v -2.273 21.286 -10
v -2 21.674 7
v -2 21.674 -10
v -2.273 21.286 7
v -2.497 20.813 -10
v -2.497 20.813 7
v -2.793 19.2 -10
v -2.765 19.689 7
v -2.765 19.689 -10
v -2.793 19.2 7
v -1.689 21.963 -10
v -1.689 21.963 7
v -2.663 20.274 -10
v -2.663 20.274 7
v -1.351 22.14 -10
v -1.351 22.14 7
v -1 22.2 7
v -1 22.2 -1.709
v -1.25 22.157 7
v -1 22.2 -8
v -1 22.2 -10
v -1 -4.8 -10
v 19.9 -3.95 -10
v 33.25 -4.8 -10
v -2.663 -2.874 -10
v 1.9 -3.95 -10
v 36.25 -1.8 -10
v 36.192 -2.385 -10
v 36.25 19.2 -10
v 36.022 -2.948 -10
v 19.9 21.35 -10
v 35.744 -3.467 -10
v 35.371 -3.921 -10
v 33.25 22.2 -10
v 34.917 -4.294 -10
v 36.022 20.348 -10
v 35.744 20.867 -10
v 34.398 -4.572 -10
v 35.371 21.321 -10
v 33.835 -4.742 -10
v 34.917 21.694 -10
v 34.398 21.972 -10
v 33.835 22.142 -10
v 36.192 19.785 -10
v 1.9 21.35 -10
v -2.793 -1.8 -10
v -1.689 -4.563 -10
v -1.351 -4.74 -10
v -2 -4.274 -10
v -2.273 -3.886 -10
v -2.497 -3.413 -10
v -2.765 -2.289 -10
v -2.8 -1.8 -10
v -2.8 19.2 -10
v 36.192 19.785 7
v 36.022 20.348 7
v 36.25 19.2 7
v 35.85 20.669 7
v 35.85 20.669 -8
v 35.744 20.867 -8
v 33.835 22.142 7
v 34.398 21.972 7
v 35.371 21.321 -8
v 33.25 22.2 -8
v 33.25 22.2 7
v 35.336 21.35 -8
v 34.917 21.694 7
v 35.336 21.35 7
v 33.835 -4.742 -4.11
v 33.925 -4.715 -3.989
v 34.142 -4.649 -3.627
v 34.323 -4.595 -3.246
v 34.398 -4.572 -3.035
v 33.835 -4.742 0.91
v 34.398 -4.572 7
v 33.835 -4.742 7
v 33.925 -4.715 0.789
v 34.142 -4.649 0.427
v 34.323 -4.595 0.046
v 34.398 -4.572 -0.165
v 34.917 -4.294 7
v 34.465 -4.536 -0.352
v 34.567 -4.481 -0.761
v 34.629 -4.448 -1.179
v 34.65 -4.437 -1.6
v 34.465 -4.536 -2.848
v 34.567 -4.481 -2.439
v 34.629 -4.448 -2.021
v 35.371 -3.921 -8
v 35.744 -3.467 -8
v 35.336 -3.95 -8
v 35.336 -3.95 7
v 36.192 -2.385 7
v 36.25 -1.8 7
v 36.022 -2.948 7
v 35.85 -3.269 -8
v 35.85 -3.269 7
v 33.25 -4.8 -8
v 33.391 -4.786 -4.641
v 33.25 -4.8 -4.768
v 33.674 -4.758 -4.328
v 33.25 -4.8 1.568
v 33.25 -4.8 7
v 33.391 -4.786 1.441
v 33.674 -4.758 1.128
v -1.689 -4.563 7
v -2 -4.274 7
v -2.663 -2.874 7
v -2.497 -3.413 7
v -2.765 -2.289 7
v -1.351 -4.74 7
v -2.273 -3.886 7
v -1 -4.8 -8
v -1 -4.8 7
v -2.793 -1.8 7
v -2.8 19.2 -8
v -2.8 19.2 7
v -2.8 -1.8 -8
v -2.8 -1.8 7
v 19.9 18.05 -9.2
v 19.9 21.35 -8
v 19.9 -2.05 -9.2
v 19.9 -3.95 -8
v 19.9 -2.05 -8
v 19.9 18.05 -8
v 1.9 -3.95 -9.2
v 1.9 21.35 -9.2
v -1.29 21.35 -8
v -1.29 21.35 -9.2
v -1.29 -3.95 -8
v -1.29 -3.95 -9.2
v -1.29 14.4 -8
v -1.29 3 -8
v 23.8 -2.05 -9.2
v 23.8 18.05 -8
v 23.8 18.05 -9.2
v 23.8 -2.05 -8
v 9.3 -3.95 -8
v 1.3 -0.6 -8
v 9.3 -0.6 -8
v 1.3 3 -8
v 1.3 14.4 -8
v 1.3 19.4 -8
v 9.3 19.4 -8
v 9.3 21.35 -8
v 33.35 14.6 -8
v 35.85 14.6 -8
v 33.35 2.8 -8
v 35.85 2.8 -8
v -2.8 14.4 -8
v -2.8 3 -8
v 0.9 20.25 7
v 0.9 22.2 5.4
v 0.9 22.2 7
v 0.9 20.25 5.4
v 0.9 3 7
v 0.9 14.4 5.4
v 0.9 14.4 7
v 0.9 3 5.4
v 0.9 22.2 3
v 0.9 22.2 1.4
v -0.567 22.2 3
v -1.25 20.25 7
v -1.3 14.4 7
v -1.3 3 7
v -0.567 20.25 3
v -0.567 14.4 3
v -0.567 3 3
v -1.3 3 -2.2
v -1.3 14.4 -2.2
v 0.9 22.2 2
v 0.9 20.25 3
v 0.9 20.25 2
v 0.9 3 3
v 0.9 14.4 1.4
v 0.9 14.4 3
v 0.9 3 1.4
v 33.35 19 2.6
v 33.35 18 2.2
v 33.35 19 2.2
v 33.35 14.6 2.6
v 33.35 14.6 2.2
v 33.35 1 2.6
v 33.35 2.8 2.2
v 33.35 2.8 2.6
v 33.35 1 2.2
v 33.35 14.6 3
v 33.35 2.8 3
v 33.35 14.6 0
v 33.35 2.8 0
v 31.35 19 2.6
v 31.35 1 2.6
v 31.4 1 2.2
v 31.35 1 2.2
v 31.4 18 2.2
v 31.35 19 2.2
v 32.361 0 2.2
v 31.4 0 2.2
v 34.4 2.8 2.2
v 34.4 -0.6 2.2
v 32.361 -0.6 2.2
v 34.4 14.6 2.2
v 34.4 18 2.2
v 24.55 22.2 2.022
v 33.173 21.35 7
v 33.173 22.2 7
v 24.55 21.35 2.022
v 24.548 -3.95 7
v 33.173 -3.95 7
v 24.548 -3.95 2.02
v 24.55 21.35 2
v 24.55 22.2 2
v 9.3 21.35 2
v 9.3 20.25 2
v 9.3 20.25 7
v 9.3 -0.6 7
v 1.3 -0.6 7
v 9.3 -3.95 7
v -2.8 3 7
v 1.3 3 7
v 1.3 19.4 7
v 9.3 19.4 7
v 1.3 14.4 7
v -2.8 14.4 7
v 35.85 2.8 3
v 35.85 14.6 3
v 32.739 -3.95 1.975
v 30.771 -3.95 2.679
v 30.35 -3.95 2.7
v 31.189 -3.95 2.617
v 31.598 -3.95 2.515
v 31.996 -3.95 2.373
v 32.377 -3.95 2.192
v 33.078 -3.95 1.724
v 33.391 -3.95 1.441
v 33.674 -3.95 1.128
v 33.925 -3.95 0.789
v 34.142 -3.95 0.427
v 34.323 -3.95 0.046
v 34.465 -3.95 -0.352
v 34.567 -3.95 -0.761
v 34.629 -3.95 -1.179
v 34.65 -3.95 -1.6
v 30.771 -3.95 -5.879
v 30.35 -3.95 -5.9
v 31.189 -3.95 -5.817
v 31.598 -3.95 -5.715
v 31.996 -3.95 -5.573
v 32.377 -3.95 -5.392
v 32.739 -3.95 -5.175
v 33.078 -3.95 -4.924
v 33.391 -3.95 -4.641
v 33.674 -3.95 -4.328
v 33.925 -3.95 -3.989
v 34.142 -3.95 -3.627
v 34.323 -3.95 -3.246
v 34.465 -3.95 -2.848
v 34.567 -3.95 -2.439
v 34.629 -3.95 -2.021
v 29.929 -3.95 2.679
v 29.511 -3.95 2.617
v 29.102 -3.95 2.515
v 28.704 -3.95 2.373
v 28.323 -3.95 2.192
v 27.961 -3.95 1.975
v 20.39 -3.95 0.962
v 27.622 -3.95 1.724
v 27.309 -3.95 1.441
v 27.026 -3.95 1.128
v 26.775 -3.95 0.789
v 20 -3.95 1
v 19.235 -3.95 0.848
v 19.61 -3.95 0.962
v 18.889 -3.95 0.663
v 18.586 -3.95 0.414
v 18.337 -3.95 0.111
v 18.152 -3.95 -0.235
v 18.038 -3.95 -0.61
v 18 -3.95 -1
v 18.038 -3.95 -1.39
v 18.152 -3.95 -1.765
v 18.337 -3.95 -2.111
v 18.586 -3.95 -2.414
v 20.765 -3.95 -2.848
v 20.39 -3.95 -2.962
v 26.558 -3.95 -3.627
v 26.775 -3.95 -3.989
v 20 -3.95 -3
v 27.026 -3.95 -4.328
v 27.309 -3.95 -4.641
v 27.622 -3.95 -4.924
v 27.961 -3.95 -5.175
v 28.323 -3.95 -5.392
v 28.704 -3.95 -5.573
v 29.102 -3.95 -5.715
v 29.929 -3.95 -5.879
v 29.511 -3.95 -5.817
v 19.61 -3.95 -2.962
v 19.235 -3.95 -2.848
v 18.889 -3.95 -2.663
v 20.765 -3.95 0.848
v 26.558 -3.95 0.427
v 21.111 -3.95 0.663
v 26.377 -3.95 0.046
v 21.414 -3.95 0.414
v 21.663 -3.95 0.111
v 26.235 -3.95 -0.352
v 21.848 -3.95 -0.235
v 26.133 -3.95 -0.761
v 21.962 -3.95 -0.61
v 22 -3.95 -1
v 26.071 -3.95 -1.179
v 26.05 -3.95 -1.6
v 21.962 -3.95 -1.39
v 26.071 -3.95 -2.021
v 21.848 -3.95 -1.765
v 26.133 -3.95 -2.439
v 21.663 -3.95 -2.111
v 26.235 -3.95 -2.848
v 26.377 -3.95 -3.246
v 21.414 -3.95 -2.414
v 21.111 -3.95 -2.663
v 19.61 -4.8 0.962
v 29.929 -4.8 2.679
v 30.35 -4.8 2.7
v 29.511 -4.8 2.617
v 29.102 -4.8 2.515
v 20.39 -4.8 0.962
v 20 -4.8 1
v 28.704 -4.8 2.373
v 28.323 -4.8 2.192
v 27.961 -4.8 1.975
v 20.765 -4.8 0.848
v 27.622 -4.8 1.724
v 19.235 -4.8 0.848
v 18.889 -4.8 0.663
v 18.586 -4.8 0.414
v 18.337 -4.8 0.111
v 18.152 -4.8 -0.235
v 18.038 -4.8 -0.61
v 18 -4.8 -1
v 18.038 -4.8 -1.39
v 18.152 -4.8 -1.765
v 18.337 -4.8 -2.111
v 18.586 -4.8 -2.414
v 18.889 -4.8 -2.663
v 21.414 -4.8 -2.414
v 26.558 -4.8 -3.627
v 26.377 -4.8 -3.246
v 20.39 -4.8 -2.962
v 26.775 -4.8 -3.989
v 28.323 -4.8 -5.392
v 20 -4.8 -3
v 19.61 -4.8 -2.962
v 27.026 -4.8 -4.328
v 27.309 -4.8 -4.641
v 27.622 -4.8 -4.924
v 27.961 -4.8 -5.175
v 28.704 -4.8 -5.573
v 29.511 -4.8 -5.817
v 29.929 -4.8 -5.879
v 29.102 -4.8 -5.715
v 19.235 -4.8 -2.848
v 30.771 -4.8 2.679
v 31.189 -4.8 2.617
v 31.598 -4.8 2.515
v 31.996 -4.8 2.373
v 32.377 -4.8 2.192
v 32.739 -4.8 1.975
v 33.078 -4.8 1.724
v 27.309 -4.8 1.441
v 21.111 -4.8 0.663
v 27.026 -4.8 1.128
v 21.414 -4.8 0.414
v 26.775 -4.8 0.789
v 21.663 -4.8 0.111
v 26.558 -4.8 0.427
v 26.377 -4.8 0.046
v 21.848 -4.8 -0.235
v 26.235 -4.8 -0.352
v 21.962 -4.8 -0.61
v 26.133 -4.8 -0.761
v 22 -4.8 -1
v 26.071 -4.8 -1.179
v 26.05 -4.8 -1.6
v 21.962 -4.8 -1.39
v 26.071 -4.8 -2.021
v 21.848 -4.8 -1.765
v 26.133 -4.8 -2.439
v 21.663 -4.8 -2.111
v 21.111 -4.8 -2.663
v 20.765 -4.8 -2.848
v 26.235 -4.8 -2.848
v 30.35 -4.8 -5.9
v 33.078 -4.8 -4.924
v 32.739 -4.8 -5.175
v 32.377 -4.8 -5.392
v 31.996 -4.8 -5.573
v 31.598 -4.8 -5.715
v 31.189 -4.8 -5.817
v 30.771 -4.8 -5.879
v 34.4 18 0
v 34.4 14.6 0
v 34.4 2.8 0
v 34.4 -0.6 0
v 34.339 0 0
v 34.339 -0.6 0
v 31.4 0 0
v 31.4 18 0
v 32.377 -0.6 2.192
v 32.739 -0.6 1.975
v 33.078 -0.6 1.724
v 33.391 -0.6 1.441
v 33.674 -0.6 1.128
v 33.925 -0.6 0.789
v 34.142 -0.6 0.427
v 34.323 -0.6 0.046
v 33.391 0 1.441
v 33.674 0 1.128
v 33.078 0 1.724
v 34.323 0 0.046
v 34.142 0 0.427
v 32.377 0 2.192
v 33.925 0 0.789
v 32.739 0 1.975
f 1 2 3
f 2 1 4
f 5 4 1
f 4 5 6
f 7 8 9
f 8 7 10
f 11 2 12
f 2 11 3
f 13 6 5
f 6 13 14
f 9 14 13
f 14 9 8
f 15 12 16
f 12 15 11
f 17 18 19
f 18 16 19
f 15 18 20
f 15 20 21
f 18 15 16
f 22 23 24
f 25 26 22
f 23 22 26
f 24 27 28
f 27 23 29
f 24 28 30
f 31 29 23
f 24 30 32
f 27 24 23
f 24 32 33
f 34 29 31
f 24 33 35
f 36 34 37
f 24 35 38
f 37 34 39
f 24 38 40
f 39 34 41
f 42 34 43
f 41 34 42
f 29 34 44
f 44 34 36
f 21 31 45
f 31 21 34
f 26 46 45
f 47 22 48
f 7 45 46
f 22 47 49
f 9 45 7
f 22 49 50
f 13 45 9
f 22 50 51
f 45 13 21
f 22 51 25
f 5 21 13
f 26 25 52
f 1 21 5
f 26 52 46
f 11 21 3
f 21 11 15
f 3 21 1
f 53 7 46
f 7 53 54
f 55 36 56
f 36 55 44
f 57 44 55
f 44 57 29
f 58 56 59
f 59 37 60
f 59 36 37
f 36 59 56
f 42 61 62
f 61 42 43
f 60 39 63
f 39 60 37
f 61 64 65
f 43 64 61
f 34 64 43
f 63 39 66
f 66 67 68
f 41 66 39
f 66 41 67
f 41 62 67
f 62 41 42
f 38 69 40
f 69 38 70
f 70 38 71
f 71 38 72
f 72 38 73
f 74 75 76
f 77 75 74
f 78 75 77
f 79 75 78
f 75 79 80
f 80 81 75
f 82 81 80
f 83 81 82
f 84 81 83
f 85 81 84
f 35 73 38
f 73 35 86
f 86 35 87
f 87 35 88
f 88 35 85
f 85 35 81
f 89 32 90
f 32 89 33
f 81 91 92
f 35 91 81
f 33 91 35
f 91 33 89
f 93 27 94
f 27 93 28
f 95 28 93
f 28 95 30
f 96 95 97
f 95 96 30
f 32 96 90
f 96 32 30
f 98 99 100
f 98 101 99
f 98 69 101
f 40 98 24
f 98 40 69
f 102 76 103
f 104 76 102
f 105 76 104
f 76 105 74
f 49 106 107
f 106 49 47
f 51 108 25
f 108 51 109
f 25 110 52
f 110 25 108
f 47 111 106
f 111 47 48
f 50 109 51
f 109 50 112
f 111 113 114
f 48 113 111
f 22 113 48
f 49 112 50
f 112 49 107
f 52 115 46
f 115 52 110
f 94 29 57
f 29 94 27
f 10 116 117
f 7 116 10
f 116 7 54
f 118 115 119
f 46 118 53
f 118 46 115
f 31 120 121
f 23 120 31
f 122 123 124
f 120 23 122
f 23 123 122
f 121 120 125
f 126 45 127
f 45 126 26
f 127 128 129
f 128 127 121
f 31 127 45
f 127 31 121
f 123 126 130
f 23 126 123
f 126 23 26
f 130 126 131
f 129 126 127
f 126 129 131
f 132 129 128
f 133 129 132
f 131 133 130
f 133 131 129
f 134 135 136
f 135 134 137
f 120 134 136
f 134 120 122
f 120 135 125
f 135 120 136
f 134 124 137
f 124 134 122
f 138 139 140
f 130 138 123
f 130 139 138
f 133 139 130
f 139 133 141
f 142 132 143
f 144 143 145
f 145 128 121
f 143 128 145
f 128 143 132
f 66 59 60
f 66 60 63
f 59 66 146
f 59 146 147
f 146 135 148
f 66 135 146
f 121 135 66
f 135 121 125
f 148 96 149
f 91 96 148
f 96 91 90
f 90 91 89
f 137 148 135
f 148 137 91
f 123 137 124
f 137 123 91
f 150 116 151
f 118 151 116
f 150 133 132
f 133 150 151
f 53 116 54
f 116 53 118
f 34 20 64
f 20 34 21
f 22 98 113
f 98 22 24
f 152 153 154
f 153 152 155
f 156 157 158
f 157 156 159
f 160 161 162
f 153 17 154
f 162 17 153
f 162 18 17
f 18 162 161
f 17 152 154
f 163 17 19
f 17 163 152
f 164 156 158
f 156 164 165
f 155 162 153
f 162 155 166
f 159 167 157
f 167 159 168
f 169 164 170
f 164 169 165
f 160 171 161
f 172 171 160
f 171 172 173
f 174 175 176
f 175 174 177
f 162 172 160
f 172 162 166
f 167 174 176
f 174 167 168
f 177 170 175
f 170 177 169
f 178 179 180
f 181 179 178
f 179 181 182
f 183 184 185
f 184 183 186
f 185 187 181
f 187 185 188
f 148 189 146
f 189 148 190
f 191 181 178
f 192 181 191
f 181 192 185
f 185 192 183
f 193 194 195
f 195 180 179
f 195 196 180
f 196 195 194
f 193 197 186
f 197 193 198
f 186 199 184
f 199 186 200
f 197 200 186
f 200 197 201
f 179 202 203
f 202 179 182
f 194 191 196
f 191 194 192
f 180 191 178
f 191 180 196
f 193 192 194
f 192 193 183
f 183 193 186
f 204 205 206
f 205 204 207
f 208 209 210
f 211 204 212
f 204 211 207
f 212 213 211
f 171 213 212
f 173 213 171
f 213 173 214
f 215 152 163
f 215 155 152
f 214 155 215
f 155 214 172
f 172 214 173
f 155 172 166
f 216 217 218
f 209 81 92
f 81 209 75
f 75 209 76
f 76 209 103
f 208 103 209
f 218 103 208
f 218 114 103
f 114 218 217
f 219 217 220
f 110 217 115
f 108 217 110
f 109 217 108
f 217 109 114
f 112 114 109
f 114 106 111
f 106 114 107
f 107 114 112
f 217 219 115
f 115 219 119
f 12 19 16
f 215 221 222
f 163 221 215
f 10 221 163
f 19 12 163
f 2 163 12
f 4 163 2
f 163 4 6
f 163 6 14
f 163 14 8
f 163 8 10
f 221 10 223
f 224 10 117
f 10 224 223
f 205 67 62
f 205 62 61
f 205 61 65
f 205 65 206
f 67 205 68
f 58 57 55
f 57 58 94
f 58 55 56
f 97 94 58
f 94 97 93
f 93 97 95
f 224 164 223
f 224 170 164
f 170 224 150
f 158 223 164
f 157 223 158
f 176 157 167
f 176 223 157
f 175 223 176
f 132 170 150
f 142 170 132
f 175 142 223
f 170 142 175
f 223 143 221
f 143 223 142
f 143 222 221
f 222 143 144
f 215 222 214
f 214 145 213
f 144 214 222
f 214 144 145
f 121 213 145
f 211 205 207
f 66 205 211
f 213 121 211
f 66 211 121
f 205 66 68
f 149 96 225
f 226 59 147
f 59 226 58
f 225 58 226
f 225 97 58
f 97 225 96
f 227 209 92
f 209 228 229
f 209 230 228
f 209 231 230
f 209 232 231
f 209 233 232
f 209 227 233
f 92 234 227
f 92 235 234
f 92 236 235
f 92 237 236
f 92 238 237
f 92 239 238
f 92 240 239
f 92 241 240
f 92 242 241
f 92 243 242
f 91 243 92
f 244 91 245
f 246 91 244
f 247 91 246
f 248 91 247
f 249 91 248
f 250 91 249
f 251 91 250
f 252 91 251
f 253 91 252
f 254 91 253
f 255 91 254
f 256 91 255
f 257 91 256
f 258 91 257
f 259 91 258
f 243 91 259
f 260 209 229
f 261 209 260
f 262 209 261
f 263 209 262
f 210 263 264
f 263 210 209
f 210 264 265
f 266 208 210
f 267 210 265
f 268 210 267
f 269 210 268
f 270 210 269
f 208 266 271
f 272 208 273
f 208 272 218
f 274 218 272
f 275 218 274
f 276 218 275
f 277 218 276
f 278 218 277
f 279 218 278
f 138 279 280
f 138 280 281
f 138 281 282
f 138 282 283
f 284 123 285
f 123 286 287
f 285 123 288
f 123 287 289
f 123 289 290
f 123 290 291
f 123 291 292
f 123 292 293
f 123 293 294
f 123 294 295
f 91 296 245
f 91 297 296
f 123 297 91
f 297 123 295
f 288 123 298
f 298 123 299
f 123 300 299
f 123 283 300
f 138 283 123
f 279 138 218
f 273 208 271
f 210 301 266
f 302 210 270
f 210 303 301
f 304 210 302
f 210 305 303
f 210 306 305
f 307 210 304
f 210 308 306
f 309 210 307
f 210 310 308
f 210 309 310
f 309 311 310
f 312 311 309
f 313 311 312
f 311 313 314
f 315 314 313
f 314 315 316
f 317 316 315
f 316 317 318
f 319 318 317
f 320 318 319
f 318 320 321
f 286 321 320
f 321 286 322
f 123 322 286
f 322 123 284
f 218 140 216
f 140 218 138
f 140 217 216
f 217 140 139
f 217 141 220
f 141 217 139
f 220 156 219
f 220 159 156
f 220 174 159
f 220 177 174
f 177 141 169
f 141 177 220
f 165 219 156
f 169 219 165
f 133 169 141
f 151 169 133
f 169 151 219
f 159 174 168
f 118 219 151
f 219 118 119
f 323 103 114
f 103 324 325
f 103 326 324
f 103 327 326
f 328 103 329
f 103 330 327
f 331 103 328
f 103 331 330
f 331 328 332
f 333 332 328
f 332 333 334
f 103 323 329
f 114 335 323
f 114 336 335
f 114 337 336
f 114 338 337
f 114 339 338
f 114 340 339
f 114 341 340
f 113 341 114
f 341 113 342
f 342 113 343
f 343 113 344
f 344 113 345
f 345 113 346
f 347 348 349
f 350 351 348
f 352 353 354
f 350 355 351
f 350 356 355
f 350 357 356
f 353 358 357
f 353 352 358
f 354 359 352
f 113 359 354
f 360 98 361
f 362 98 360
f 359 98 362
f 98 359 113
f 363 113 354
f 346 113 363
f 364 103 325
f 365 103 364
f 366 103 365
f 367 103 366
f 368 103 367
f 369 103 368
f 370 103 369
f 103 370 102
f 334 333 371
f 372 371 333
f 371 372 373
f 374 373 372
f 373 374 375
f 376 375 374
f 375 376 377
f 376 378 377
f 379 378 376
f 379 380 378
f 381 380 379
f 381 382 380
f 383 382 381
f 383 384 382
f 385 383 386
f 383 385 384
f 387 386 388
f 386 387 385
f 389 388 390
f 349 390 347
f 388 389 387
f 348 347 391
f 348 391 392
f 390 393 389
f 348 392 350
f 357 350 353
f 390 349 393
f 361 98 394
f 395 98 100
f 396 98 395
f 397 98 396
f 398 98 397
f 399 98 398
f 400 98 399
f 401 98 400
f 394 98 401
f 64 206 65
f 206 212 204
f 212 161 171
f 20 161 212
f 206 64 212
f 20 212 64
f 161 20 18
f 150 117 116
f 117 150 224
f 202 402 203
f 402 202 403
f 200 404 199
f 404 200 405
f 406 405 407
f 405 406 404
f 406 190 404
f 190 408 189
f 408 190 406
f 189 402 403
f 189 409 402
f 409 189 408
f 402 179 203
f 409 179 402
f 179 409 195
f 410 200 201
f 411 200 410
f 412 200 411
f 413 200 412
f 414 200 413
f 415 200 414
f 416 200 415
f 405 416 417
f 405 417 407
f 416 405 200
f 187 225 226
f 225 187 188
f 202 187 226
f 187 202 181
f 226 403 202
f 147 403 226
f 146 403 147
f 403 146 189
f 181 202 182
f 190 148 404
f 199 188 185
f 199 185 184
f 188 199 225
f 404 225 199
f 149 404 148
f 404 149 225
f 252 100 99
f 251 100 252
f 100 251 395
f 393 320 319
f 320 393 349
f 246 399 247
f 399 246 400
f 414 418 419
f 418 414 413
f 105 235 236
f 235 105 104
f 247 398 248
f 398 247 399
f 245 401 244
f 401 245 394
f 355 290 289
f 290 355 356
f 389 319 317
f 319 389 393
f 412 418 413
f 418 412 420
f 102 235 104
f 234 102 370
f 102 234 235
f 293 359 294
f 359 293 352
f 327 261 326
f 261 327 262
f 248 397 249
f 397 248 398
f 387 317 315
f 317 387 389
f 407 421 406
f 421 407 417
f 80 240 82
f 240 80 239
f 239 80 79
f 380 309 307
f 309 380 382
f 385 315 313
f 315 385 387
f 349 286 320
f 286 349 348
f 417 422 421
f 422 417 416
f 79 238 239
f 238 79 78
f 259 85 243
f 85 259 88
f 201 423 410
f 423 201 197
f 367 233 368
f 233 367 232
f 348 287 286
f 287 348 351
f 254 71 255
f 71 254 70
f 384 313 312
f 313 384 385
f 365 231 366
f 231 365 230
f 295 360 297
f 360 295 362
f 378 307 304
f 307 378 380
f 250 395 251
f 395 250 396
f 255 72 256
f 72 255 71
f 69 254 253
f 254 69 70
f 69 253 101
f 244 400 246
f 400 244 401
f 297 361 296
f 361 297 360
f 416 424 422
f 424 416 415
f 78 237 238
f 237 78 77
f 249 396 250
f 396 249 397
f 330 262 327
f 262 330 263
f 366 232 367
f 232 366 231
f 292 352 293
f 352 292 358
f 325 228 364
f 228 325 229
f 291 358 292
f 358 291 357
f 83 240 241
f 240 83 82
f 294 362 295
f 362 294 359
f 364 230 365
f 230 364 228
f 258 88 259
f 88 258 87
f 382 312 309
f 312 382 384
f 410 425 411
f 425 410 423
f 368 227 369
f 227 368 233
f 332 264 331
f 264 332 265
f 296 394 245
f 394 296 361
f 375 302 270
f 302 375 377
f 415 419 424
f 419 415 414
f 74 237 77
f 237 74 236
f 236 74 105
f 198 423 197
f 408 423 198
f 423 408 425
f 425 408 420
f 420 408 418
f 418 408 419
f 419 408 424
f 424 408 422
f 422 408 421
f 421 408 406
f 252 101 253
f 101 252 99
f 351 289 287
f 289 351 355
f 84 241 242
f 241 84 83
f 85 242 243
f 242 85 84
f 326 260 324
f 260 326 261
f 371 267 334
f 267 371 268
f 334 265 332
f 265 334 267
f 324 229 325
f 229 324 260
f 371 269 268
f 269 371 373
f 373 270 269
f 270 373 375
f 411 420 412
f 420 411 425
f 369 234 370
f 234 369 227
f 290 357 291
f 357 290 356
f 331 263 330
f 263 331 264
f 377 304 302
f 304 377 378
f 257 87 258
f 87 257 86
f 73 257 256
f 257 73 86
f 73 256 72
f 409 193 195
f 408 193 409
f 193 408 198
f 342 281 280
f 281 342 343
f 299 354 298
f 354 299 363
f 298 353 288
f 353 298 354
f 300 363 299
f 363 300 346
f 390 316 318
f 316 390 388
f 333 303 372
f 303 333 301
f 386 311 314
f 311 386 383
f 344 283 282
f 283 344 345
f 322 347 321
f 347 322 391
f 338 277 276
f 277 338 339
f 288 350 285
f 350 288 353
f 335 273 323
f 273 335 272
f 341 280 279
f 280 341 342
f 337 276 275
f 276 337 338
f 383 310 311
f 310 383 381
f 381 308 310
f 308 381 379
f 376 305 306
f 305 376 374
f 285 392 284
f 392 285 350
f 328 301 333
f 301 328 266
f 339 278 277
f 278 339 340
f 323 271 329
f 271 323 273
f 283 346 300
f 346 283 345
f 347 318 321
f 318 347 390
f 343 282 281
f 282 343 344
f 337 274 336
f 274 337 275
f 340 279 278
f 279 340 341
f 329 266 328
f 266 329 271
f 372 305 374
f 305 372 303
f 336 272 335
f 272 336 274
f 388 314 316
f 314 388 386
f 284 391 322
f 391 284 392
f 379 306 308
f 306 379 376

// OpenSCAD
w = 33;
d = 18.2;
h = 1.5 + .1;

USB_PADDING = 4.4;
OVERLAP = 2.5;
XMAX = 1.1;
JACKD = 8 + 0.2;
tx = 1.25;
ty = 0.4;
HEADER_D = 3;
HEADER_H = 0.2 * 8;
H_MULT = 16;

OLED_OFFSET = 0.8;
OLED_BW = 25.3 + OLED_OFFSET;
OLED_BD = 26.1 + OLED_OFFSET;
OLED_H = 6;

BASE_W = w + (2 * tx) + 0.4;
BASE_D = d + 0.4;
BASE_H = (0.2 * 3) + HEADER_H;

SIDE_H = BASE_H + (0.2 * H_MULT + h);
SIDE_T = 1.6;
SIDE_LONG = w + .6 + .5 + 0.4;
SLTX = SIDE_T - 0.2;

PCB_W = d + 0.4;

OLED_SW = 25.3;
OLED_SD = 16.8;

OLED_B = [OLED_BD + 9.2, OLED_BW, OLED_H];
OLED_S = [OLED_SD + 1.2, OLED_SW, 8];
OLED_B2 = [
  OLED_B[0] + 4.15, 
  OLED_B[1] + 0.9, 
  OLED_B[2] - 4
];

MIC_D = 8.6;
MIC_D_RING = 11;


OLED_TY = (OLED_BW - BASE_W) / 2 + 1.35 - OLED_OFFSET;  
w1 = 3.45;

WALL_POLY = [
  [-2.8, -4.8],
  
  [w + w1 + 1, -4.8],
  [w + w1 + 1, 3],  
  [w + w1 - 3.1, 3],
  [w + w1 - 3.1, -2.0],
  [w + w1 - 11.1, -2],
  
  [w + w1 - 11.1, -5.15 + 1.2],
  [-2.4 + 1.2, -5.15 + 1.2],
  [-2.4 + 1.2, d + 4.35 - 1.2],
  [w + w1 - 11.1, d + 4.35 - 1.2],
  
  [w + w1 - 11.1, d - 0.2],
  [w + w1 - 3.1, d - 0.2],
  [w + w1 - 3.1, d + 4.35 - 8.15],
  [w + w1 + 1, d + 4.35 - 8.15],
  [w + w1 + 1, d + 4.0],
  
  [-2.8, d + 4.0]
];

BR = 3;

module clip(d, zr = 0) {
  rotate([90, 0, zr])
    translate([-1.8, 0, 0])
      linear_extrude(d)
        polygon([          
          [2.2, h - 4],
          [2.2, h * 1.75],
          [0, h * 1.75],
          [0, h * 1.5],
          [0, h - 0.4]
        ]);
  }
  
module oledSlicer(extraH = 0) {
  translate([
      OLED_OFFSET / 2, 
      OLED_OFFSET / 2,
      0.2 * 4 - extraH
    ])
      cube([
        OLED_BD - OLED_OFFSET,
        OLED_B[1] - OLED_OFFSET,
        0.2 * 8 + extraH
      ]);
}
 
intersection() {
  if (!$preview) {
    translate([
      -2.35 - SIDE_T - 0.05, 
      OLED_TY - 0.45, 
      -OLED_H
    ])
      translate([0, 0, -0.2 * 12 - .6 - 1]) {
        H = OLED_B2[2] + 18;
        translate([BR, OLED_B2[1] - BR - .12, 0]) 
          scale([.6, 1.04, 1]) 
            cylinder(H, d = BR * 2, $fn = 32);
        
        translate([OLED_B2[0] - BR, OLED_B2[1] - BR, 0])
          cylinder(H, d = BR * 2, $fn = 32);
        
        translate([OLED_B2[0] - BR, BR, 0]) 
          cylinder(H, d = BR * 2, $fn = 32);
        
        translate([BR, BR + .12, 0]) scale([.6, 1.04, 1]) 
          cylinder(H, d = BR * 2, $fn = 32);
        
        translate([BR, 0, 0]) 
          cube([OLED_B2[0] - BR * 2, OLED_B2[1], OLED_B2[2] + 18]);
        
        translate([0, BR, 0]) 
          cube([OLED_B2[0], OLED_B2[1] - BR * 2, OLED_B2[2] + 18  ]);
      }
  }

  union() {
    // OLED COVER
    translate([
      0 - SIDE_T - 0.05, 
      OLED_TY, 
      -OLED_H
    ])
      difference() {    
        translate([-1.15, -.45, -.2 * 12 - 1.6])
          cube(OLED_B2);
        
        translate([-2.35, 0, 0]) {
          translate([OLED_BD - OLED_SD - 3 - 1.2, 0.4, -7])
            cube(OLED_S);
                    
          translate([OLED_BD - OLED_SD - 7.39, 0.4, -3.2])          
            cube([3.2, OLED_BW - 0.8, 3]);
          
          translate([OLED_BD - 3.1, 2.3, -3.2])
            cube([4, OLED_BW - 6, 2]);                
        }
      }
        
      // PCB CLIPS
      group() {
        translate([-0.9, -0.6, BASE_H])
          union() {
            translate([0, -4, 2])
              clip(PCB_W + 8.2, 180);
          
            translate([0, -4, -2])
              clip(PCB_W + 8.2, 180);
          }
       
        translate([w + 0.15, -2.6, BASE_H]) 
          translate([-1.8, 3.6, 0])
            cube([2, 18, 0.2 * 2]);
      }

      // PCB BASE
      difference() {
        union() {   
         difference() {
          translate([w + 1.65, d - 0.8, -8])
            linear_extrude(15, convexity = 3, slices = 15 / 0.4)
              rotate([0, 0, 180])
                polygon(WALL_POLY); 

            ch = d + 6.9;
           
            translate([w - 5, -3.95, 8]) {
              translate([0, -0.0, 0])
              rotate([0, 30, 0])
                rotate([0, 90, 90])
                  cylinder(h = ch + 0.2 + 1.6, d = 13.81, $fn = 3);
              
              translate([-w + 3.75, d + 6, -6])
                cube([w - 7.2, 4, 5.1]);
            }
          }
        
          // BASE
          translate([4 + w - MIC_D, -ty - 0.2, 0])      
            cube([
              6, 
              BASE_D, 
              BASE_H
            ]);
          
          // SIDES
          translate([-1.25 - 0.2, -2.2, 0]) {  
            OLED_EXTRA = 2.95;
            SIDE_T_2 = SIDE_T + OLED_EXTRA;      

            translate([
              -1 + w + 3.5 - 0.7, 
              -OLED_EXTRA + 7.95, 
              -8
            ]) 
              cube([SIDE_T + 1.5, 11.8, 11]);         
          }
        }  
        
        // MIC SLICERS
        group () {
          translate([
            w - SIDE_T * 2 - 0.45,
            0,
            -0.8 - 0.8
          ]) {
            *translate([0, 3, -1.5])
              rotate([0, 90, -90]) 
                translate([0, 1, 2])
                  cylinder(d = MIC_D_RING, h = 3, $fn = 64);
          
              rotate([0, 90, -90]) 
                translate([0, 1, 0])
                  cylinder(d = MIC_D, h = 8, $fn = 64);
          }
          
          
          // MIC OVERHANG REMOVAL
          translate([
            w - SIDE_T * 2 - SIDE_T * 2 + 0.8 - 1, 
            -0.2,
            0
          ])
            cube([5, d, HEADER_H + 4]);
        }      
        
        translate([20, -6, -1]) 
          rotate([0, 90, 90])
            cylinder(d = 4, h = 3, $fn = 32);
      }
  }
}
